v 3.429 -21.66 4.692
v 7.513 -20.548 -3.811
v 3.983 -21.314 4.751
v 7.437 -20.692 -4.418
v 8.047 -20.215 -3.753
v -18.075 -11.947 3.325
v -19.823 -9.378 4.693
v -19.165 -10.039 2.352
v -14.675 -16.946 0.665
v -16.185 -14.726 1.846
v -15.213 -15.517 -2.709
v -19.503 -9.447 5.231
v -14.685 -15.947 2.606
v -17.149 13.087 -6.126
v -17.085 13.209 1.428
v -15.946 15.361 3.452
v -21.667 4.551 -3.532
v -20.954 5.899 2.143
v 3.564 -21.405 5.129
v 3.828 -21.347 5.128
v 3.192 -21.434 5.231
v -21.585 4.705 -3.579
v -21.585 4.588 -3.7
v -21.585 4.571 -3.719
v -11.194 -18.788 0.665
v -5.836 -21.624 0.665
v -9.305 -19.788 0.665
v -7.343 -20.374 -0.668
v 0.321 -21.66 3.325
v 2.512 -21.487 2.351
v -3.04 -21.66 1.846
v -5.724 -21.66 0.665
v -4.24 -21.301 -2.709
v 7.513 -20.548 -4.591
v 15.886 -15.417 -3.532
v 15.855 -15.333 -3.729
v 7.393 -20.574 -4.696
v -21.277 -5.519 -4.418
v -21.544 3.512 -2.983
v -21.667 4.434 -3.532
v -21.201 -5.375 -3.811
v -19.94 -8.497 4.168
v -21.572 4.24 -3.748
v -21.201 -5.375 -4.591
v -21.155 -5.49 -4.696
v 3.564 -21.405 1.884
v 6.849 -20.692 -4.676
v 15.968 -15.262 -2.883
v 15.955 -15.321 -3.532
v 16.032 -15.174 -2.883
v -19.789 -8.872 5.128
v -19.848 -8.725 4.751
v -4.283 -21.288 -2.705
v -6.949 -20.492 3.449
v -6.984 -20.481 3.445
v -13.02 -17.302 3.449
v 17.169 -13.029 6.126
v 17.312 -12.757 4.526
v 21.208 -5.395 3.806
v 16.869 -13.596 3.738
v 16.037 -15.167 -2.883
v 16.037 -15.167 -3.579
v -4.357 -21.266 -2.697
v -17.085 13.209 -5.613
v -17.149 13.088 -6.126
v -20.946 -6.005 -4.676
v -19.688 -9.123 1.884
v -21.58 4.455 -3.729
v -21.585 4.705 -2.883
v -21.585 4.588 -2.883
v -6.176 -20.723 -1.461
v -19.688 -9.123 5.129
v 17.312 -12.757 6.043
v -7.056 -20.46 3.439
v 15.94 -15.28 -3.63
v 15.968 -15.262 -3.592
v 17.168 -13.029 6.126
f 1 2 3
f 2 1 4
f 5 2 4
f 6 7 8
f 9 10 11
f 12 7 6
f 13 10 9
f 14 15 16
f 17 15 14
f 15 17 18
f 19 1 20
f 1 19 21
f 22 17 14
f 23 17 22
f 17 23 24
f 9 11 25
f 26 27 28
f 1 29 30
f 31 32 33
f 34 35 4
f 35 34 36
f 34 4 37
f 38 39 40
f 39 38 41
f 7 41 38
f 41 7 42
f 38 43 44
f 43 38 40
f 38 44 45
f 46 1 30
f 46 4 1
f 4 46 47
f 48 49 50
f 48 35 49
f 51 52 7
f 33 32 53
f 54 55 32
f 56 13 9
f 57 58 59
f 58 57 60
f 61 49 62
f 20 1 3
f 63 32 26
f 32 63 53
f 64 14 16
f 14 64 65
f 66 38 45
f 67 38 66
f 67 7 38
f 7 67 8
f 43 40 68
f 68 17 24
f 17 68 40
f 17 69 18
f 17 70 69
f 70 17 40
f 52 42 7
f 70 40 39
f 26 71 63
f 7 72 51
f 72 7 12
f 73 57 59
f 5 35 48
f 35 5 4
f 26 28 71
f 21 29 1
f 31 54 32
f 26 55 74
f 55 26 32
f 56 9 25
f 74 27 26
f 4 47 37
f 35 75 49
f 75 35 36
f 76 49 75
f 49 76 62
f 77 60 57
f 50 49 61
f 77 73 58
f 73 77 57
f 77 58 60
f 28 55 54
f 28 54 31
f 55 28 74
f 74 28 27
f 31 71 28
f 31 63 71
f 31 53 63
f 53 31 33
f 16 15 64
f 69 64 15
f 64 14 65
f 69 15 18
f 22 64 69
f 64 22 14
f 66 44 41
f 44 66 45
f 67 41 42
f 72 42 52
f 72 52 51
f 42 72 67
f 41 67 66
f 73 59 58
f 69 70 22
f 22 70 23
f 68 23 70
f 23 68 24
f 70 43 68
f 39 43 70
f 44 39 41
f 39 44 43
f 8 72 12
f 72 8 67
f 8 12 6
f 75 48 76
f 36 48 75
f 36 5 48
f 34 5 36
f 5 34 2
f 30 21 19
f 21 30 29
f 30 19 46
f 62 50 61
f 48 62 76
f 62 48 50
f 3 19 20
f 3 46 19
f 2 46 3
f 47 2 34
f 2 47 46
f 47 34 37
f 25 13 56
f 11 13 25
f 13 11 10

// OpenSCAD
// Auto-generated OpenSCAD file

    inner_points = 10*[[0.3533042389474486, -2.1309567627878985, -0.49328765376831396], [-0.1434686338513388, 1.458507778837387, 1.7006204863472152], [0.9546307475624638, -1.655329376601087, -1.1353040239225165], [0.45785787476367645, 1.9341351650241985, 1.0586041161930126], [-0.43704610665881893, -1.894813525510864, -1.0586041161930126], [-0.9338189794576062, 1.6946510161144215, 1.1353040239225165], [0.1642804019561963, -1.4191861393240526, -1.7006204863472152], [-0.3324924708425911, 2.1702784023012325, 0.49328765376831396], [1.442367608438407, -1.1419910934272737, 1.2594119381637667], [1.3250954410800369, -0.29463345877858294, 1.777323395621165], [2.043694117053422, -0.6663637072404623, 0.6173955680095642], [1.9264219496950519, 0.1809939274082285, 1.1353070254669624], [-1.9056101815901942, -0.14167228789489406, -1.1353070254669624], [-2.022882348948565, 0.7056853467537968, -0.6173955680095642], [-1.3042836729751792, 0.3339550982919174, -1.777323395621165], [-1.4215558403335493, 1.1813127329406081, -1.2594119381637667], [-0.23698424864327555, -2.1774209753120197, 0.31256628980481815], [-0.926685010406531, -0.6821269514814432, 1.9014264532614829], [1.7378471241176563, 0.4853053537177433, -1.3361099908367842], [1.6205749567592862, 1.3326629883664343, -0.818198533379386], [-1.0273345942495429, -1.9412777380349853, -0.25275017261988053], [-1.7170353560127987, -0.44598371420440885, 1.3361099908367842], [0.9474967785113886, 0.7214485909947776, -1.9014264532614829], [0.8302246111530187, 1.5688062256434685, -1.3835149958040847], [-1.272154046123399, -1.3349344510202745, 1.227265112107367], [-0.9888880786112537, 0.9299408496408343, 1.7773209673206987], [1.0096998467161113, -0.8906192101274999, -1.7773209673206987], [0.5854051592791625, 2.1751495126581784, 0.09650028892316316], [1.5936743508035691, -1.5167318536526972, 0.34471218833297446], [1.2866518307249903, 0.7016792344842905, 1.7006219871194381], [-1.2658400626201327, -0.662357594970956, -1.7006219871194381], [-1.5728625826987115, 1.5560534931660317, -0.34471218833297446], [-0.04282195529156968, -1.1498727155477642, 1.901427380789726], [2.1327977912138616, 0.5709633336563915, -0.42140966776201205], [-2.1119860231090044, -0.5316416941430571, 0.42140966776201205], [0.0636337233964272, 1.1891943550610986, -1.901427380789726], [0.7482549060436543, -2.04529878284925, 0.4214126693064581], [0.36875420060323677, 0.6968081241273445, 2.097409351964589], [1.7212216353190553, -1.2757175060187171, -0.6173916389368752], [1.341720929878638, 1.4663894009578775, 1.0586050437212557], [-1.3209091617737803, -1.427067761444543, -1.0586050437212557], [-1.7004098672141976, 1.3150391455320516, 0.6173916389368752], [-0.34794243249837925, -0.65748648461401, -2.097409351964589], [-0.7274431379387967, 2.084620422362584, -0.4214126693064581], [0.5969481636784919, -1.6705580226238264, 1.3361124191372504], [0.40719781095828333, -0.29950456913552903, 2.174110760466316], [2.171241401568908, -0.4253493596064819, -0.34470825926028514], [1.9814910488486996, 0.9457040938818155, 0.4932900820687803], [-1.960679280743842, -0.9063824543684811, -0.4932900820687803], [-2.150429633464051, 0.46467099911981635, 0.34470825926028514], [-0.3863860428534258, 0.3388262086488635, -2.174110760466316], [-0.5761363955736345, 1.7098796621371608, -1.3361124191372504], [-0.38829099100843784, -1.8026802150865957, 1.2272660396356103], [-0.47666524415667827, 0.16824119493079182, 2.174109832938073], [1.7762907344727028, -0.51100733954513, -1.2594085823350576], [1.469268214394124, 1.7074037485918578, 0.0965012164514063], [-1.6671047132196049, -1.4205924309589228, 0.31256478903259505], [-1.7554789663678452, 0.5503289790584645, 1.2594085823350576], [0.4974770122615358, -0.12891955541745742, -2.174109832938073], [0.19045449218295696, 2.0894915327195305, -0.818200034151609]];

    outer_points = 10*[[0.3397964015329416, -2.1564818960662593, 0.4692464330642543], [0.1746904120016975, 2.059700581213336, 0.8445026661911221], [0.7406306924188368, -2.059700581213336, -0.44177785220224774], [0.5755247028875927, 2.1564818960662593, -0.0665216190753799], [-0.5755247028875927, -2.1564818960662593, 0.0665216190753799], [-0.7406306924188368, 2.059700581213336, 0.44177785220224774], [-0.1746904120016975, -2.059700581213336, -0.8445026661911221], [-0.3397964015329416, 2.1564818960662593, -0.4692464330642543], [1.7577521828507068, -0.5460434925171852, 1.2642039967754415], [1.7187759458289644, 0.4492621776642618, 1.3527899767738907], [2.158586473736602, -0.4492621776642618, 0.35317971150893934], [2.11961023671486, 0.5460434925171852, 0.44176569150738865], [-2.11961023671486, -0.5460434925171852, -0.44176569150738865], [-2.158586473736602, 0.4492621776642618, -0.35317971150893934], [-1.7187759458289644, -0.4492621776642618, -1.3527899767738907], [-1.7577521828507068, 0.5460434925171852, -1.2642039967754415], [-0.03615139041812482, -1.7979315082680976, 1.3237081800938717], [-0.4108082182533923, 0.29266672075632677, 2.1752357977646932], [1.3261293226739266, -0.29266672075632677, -1.772510983775819], [1.2871530856521844, 0.7026389494251202, -1.6839250037773699], [-0.951472494838659, -1.7979315082680976, 0.9209833661049974], [-1.3261293226739266, 0.29266672075632677, 1.772510983775819], [0.4108082182533923, -0.29266672075632677, -2.1752357977646932], [0.37183198123165007, 0.7026389494251202, -2.086649817766244], [-0.8691142525215587, -0.5733571998568047, 1.9753404554496539], [-0.5952075738469856, 1.673836486075555, 1.3527998149826952], [0.5952075738469856, -1.673836486075555, -1.3527998149826952], [0.45419022354875016, 1.9272132578364132, -1.0322927284215873], [1.706851989845039, -1.3028720368652604, 0.6125754792810341], [1.6048108765685456, 1.3028720368652604, 0.8444965858436926], [-1.6048108765685456, -1.3028720368652604, -0.8444965858436926], [-1.706851989845039, 1.3028720368652604, -0.6125754792810341], [0.4730548368557097, -0.1750790433068909, 2.1752320399033187], [1.9232869251373408, 0.1750790433068909, -1.1208847887674662], [-1.9232869251373408, -0.1750790433068909, 1.1208847887674662], [-0.4730548368557097, 0.1750790433068909, -2.1752320399033187], [0.9369540039963559, -1.6887361320030414, 1.1208726280726071], [0.810824251486854, 1.5321406750951065, 1.4075428812010258], [1.5855175105061965, -1.5321406750951065, -0.3531956300651734], [1.4593877579966947, 1.6887361320030414, -0.06652537693675475], [-1.4593877579966947, -1.6887361320030414, 0.06652537693675475], [-1.5855175105061965, 1.5321406750951065, 0.3531956300651734], [-0.810824251486854, -1.5321406750951065, -1.4075428812010258], [-0.9369540039963559, 1.6887361320030414, -1.1208726280726071], [0.9878541970020238, -0.9319075876549662, 1.7725011455670145], [0.9247893207472729, 0.6785308158941078, 1.9158362721312236], [2.0372519943977596, -0.6785308158941078, -0.6125913978372679], [1.9741871181430086, 0.9319075876549662, -0.4692562712730588], [-1.9741871181430086, -0.9319075876549662, 0.4692562712730588], [-2.0372519943977596, 0.6785308158941078, 0.6125913978372679], [-0.9247893207472729, -0.6785308158941078, -1.9158362721312236], [-0.9878541970020238, 0.9319075876549662, -1.7725011455670145], [0.014748802587543075, -1.0411029639200224, 1.9753366975882793], [0.04092626563817092, 1.1462765799573253, 1.9158400299925986], [1.4400943919343452, -1.1462765799573253, -1.2642175928456207], [1.3380532786578523, 1.4594674937731955, -1.0322964862829624], [-1.4662718549849731, -1.0411029639200224, 1.3237142604413015], [-1.4400943919343452, 1.1462765799573253, 1.2642175928456207], [-0.04092626563817092, -1.1462765799573253, -1.9158400299925986], [-0.14296737891466405, 1.4594674937731955, -1.6839189234299403]];

    // Convex hull for inner set (I)
    module inner_hull() {
        hull() {
            for (p = inner_points) {
                translate(p) sphere(r=0.1);
            }
        }
    }

    // Convex hull for outer set (O) minus inner hull (O \ I)
    module outer_minus_inner() {
        difference() {
            hull() {
                for (p = outer_points) {
                    translate(p) sphere(r=0.1);
                }
            }
            inner_hull(); // Subtract inner hull
        }
    }

    // Convex hull for outer set (O) minus all translated inner hulls
    module outer_minus_AllTranslationInner() {
        difference() {
            hull() {
                for (p = outer_points) {
                    translate(p) sphere(r=0.1);
                }
            }
            hull() {
                translate([0,0,50]) inner_hull();
                translate([0,0,-50]) inner_hull();
            }; // Subtract translated inner hulls
        }
    }

    // Difference between outer_minus_inner and outer_minus_AllTranslationInner
    module outer_minus_inner_diff() {
        difference() {
            // Outer minus inner
            difference() {
                hull() {
                    for (p = outer_points) {
                        translate(p) sphere(r=0.1);
                    }
                }
                inner_hull();
            }

            // Subtract Outer minus AllTranslationInner
            difference() {
                hull() {
                    for (p = outer_points) {
                        translate(p) sphere(r=0.1);
                    }
                }
                hull() {
                    translate([0,0,50]) inner_hull();
                    translate([0,0,-50]) inner_hull();
                };
            }
        }
    }

    // Rendering all with colors applied
    color([0, 1, 0, 1]) outer_minus_AllTranslationInner(); // Opaque green
    
